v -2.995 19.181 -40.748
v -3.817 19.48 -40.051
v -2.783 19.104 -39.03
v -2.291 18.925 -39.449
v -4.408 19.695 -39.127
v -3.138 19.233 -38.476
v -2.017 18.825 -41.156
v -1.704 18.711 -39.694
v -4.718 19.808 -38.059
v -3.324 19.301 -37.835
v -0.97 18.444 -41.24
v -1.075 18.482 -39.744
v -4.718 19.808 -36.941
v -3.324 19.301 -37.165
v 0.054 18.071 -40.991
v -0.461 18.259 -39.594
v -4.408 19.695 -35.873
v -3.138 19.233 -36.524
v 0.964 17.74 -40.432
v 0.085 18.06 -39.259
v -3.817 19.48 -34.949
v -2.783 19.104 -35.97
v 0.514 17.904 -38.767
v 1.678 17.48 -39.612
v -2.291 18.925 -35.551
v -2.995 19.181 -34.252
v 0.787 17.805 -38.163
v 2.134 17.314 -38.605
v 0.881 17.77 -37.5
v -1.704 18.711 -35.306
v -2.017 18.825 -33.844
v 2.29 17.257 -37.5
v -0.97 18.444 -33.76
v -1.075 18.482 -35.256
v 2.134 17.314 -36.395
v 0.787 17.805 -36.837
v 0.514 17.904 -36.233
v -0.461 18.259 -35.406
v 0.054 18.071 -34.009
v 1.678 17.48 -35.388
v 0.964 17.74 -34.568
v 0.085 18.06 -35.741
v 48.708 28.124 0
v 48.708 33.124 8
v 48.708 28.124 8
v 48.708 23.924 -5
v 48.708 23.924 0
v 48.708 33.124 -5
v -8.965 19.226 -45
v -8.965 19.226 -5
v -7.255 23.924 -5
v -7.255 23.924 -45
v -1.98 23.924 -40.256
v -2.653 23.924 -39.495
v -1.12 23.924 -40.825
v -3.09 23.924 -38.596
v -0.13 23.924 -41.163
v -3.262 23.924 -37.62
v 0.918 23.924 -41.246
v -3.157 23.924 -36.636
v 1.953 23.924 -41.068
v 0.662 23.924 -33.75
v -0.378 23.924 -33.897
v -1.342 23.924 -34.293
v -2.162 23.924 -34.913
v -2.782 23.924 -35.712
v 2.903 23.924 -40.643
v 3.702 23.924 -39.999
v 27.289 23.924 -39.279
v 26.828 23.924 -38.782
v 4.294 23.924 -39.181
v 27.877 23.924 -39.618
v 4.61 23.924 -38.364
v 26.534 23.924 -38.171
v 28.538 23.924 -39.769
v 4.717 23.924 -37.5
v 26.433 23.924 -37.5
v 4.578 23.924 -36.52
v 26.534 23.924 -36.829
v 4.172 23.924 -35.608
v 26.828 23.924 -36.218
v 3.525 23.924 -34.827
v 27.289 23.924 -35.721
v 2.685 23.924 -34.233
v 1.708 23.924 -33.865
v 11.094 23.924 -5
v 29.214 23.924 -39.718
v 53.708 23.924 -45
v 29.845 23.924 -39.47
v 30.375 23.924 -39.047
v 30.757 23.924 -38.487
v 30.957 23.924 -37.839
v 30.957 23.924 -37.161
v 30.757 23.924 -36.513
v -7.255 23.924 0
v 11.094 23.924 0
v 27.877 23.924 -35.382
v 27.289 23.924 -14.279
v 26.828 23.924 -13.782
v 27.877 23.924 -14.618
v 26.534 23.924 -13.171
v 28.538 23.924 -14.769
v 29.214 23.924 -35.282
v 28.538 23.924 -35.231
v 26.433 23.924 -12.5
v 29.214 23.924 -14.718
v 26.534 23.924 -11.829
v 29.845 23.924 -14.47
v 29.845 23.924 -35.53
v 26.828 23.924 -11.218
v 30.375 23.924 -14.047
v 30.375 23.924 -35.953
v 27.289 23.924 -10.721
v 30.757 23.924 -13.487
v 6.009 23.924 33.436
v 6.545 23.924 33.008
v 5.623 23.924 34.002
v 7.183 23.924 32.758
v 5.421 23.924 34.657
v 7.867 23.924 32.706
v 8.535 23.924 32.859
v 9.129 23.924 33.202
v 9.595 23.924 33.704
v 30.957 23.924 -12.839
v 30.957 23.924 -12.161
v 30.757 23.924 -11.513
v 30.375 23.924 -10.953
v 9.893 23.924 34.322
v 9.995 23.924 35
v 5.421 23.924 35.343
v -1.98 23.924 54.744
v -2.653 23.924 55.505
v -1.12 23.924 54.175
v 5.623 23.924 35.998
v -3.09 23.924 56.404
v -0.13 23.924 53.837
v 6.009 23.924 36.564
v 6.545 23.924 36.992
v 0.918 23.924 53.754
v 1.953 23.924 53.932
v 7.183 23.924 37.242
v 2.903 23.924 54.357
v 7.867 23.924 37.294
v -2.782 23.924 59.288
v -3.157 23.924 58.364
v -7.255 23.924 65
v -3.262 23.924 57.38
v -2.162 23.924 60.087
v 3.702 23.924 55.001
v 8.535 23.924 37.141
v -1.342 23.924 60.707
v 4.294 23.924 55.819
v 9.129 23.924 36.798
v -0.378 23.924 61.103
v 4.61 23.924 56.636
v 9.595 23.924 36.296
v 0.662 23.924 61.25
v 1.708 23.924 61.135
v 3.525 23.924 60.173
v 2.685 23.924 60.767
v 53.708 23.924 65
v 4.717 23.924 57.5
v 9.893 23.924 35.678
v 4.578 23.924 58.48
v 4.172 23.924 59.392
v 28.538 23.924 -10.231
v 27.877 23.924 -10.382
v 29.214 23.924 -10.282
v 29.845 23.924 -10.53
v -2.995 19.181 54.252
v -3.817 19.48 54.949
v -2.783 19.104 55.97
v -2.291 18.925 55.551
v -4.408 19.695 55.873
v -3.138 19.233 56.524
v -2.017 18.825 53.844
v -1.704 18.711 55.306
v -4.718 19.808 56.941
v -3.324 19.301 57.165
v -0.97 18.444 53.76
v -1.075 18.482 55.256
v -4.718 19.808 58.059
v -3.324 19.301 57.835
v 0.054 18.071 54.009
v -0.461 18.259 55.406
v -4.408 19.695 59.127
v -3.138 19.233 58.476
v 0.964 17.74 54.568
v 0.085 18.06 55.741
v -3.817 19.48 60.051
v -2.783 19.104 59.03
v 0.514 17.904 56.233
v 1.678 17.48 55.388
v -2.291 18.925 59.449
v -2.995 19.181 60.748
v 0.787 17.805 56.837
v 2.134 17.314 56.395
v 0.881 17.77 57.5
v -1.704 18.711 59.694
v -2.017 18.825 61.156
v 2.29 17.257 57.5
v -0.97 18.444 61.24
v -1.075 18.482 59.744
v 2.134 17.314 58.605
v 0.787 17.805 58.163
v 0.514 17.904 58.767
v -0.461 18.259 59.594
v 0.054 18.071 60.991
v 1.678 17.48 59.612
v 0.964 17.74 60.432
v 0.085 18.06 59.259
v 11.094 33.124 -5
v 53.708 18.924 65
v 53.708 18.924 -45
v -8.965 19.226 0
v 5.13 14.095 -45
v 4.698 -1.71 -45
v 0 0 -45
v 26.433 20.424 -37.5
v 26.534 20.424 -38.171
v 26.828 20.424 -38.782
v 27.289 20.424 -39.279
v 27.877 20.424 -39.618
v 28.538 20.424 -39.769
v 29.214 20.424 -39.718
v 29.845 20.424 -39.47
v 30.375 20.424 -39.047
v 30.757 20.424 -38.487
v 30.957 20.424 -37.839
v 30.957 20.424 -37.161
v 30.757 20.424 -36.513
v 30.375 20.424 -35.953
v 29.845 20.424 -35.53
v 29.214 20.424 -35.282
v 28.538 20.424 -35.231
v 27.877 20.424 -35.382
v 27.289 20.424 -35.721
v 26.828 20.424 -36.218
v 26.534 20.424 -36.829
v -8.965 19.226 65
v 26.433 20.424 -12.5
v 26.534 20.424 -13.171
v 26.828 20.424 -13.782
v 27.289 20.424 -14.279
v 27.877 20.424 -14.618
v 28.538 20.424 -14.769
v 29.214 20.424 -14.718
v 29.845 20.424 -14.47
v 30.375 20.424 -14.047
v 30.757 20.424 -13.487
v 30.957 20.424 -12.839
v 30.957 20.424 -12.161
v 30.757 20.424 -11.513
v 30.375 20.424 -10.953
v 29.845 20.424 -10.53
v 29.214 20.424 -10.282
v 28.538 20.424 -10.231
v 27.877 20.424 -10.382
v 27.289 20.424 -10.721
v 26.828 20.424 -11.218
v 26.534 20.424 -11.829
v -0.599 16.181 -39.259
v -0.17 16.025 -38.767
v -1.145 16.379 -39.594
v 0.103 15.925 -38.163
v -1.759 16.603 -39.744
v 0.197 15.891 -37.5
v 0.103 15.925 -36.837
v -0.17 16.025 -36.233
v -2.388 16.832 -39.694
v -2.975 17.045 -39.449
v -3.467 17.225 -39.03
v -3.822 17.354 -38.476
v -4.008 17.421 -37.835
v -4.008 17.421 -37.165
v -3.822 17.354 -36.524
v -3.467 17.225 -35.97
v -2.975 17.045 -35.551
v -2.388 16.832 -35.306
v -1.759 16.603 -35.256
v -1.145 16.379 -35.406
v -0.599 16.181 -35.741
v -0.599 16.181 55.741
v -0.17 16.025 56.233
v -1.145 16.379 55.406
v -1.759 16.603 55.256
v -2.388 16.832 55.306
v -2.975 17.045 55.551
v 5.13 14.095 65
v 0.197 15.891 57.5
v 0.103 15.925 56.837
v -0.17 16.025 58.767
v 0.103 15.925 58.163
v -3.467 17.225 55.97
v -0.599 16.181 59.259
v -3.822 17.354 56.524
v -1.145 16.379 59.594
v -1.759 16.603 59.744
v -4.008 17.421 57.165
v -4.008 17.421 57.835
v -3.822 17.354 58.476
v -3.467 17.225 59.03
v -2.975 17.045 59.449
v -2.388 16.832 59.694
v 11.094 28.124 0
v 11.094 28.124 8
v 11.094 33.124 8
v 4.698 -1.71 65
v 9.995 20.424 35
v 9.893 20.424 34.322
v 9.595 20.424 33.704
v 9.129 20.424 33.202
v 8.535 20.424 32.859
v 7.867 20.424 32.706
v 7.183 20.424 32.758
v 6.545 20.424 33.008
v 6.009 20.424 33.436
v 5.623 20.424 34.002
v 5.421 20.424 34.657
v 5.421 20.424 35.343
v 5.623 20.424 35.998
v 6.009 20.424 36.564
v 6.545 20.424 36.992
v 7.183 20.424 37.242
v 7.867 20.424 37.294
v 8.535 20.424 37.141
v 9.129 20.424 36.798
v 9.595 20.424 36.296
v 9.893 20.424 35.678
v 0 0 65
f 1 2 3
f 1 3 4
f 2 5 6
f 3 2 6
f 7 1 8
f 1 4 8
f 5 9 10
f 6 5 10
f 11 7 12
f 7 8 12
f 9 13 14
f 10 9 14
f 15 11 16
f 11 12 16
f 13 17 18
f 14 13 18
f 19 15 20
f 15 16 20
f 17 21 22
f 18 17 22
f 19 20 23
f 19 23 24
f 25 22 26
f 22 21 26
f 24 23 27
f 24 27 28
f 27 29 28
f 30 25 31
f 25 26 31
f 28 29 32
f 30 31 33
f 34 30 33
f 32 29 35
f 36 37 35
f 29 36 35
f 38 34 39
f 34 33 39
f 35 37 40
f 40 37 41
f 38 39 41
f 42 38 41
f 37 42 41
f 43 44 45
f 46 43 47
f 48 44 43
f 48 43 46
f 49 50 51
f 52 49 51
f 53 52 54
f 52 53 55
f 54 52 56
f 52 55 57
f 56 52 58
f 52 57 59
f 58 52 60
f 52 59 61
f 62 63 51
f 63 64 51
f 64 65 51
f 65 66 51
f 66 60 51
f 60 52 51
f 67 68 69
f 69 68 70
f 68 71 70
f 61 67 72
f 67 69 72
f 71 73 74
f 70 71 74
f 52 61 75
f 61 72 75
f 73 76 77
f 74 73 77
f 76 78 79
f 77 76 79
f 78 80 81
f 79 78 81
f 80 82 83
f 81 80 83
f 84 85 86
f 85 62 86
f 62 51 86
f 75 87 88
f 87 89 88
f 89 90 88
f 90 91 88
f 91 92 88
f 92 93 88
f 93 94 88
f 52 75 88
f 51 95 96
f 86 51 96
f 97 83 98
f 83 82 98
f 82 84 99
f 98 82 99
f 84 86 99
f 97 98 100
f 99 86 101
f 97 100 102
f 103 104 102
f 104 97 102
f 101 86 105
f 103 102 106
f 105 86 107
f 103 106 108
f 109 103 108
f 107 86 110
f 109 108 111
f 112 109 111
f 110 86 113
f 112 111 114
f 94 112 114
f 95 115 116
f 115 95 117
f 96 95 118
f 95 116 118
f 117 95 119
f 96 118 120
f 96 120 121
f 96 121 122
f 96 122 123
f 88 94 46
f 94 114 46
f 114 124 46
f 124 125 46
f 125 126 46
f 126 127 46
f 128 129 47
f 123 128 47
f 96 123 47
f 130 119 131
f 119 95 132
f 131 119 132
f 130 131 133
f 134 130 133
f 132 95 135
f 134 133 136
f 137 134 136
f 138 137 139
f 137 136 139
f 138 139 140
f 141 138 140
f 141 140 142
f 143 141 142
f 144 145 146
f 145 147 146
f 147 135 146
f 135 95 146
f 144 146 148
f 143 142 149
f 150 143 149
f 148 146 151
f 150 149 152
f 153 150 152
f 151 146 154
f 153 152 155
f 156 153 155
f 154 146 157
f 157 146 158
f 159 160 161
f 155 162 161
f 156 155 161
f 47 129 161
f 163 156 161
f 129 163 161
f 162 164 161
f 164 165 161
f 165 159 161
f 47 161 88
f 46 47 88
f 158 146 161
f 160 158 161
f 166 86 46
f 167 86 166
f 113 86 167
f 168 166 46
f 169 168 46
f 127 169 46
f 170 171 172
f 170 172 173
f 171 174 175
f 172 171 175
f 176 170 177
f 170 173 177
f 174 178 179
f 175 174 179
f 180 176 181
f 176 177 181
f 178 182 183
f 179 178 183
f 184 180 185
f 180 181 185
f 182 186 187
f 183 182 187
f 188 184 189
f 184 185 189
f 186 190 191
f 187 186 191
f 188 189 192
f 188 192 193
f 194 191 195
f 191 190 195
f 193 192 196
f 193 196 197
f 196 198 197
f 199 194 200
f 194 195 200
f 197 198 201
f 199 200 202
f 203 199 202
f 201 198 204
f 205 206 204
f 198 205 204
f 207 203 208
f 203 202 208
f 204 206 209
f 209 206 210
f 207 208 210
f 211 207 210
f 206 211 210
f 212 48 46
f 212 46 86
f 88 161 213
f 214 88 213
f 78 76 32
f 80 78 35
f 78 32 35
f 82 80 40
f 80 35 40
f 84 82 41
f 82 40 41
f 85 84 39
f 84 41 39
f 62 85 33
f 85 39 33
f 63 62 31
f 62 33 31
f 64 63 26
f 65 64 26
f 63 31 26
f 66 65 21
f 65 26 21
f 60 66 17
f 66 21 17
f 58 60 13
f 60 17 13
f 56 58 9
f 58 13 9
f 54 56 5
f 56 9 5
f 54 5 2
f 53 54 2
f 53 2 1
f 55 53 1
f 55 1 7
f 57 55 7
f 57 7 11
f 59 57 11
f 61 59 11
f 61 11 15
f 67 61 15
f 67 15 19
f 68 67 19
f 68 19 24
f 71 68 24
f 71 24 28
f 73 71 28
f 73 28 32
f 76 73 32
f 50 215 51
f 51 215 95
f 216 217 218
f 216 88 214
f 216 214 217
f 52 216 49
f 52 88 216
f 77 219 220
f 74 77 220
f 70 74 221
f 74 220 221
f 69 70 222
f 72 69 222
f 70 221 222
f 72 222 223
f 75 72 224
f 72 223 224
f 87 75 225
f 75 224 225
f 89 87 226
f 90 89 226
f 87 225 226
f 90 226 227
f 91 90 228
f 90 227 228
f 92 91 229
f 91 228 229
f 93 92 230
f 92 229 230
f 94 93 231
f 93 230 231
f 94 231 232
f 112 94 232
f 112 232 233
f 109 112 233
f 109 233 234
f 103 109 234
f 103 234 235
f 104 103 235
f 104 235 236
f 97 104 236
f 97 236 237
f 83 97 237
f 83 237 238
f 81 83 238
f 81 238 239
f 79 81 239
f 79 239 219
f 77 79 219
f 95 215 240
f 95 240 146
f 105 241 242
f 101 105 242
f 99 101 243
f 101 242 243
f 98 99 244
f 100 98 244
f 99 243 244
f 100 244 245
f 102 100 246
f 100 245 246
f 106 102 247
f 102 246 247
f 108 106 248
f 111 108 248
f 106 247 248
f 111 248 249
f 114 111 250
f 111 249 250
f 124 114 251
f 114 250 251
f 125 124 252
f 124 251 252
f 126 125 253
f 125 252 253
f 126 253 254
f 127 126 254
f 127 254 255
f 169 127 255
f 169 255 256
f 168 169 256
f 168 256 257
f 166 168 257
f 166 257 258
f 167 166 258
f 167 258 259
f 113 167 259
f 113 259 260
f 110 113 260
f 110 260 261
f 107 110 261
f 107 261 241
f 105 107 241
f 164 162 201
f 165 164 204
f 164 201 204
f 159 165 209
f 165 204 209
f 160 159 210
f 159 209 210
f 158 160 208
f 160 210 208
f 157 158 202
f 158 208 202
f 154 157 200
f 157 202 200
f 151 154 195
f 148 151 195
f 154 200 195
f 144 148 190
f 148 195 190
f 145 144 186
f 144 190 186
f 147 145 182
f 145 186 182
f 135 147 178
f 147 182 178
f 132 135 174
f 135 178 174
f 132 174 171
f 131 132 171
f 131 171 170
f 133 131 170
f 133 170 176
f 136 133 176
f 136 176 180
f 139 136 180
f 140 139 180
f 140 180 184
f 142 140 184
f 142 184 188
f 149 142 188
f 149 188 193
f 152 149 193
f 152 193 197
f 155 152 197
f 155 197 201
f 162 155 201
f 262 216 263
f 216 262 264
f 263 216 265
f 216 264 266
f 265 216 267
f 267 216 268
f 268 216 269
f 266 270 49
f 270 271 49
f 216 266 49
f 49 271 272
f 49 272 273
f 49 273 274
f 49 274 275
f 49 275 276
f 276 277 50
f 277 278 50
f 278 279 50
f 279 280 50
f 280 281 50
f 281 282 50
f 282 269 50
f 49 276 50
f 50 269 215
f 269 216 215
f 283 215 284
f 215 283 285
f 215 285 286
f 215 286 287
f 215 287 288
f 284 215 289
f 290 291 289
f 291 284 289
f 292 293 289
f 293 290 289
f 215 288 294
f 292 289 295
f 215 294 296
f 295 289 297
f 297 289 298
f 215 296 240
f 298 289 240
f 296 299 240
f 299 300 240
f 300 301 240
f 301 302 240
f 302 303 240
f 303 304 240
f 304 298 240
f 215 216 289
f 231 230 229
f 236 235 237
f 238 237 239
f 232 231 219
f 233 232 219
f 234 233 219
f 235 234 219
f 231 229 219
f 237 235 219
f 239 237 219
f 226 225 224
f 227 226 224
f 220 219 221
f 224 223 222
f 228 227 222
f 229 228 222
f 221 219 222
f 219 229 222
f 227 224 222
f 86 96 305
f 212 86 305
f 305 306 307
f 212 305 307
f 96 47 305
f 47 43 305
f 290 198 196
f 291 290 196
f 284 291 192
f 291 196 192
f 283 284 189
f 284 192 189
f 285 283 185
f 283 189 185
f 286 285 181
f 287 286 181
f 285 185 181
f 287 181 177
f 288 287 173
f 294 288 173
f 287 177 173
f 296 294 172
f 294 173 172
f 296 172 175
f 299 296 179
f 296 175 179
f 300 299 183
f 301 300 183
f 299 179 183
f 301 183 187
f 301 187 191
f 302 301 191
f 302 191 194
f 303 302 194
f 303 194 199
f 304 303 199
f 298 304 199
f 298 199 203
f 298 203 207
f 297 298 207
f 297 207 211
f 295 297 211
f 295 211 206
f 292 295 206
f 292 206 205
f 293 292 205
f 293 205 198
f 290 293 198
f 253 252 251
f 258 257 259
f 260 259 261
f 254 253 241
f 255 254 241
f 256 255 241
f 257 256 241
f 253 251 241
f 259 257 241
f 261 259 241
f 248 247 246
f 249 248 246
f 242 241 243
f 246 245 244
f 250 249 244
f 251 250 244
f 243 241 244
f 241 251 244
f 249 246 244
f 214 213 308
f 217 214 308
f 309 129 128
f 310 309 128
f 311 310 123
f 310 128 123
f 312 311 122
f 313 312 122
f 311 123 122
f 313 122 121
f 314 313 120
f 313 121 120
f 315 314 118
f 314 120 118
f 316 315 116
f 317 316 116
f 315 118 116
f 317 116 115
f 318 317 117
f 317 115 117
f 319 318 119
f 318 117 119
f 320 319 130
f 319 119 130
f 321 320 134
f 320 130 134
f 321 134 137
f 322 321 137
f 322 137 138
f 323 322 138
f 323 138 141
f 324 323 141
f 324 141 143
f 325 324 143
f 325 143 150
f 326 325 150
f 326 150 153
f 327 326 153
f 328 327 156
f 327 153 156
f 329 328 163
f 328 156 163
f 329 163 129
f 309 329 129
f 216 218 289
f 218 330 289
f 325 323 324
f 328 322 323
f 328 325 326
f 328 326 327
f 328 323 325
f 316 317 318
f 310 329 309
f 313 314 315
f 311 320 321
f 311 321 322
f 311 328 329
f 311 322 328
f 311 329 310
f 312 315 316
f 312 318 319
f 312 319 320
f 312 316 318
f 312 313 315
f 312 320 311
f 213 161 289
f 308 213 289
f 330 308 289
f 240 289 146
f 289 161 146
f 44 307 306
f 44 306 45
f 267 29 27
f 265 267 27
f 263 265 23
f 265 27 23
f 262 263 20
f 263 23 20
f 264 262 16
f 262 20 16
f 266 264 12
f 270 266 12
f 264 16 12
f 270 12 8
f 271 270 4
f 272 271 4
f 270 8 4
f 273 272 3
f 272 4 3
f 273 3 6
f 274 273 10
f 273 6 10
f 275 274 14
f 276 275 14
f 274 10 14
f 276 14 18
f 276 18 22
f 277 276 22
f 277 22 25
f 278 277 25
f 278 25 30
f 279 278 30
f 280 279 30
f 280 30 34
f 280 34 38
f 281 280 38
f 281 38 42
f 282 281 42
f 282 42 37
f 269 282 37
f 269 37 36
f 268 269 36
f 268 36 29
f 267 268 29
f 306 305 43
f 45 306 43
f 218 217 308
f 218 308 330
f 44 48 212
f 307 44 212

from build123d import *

# Parameters (mm, degrees)
EXTRUDE_1_DEPTH        = 65
EXTRUDE_2_DEPTH        = 5
EXTRUDE_3_DEPTH        = 8
SKETCH_8_R             = 2.3
CUT_EXTRUDE_4_DEPTH    = 3.5
CUT_EXTRUDE_6_DEPTH    = 14
EXTRUDE_4_DEPTH        = 40
HOLE_WIZARD_M4_1_D     = 4.5
HOLE_WIZARD_M4_1_DEPTH = 10
HOLE_WIZARD_M4_1_TIP   = 1.351936393
CUT_EXTRUDE_START      = -2
SKETCH_16_R            = 3.75
CUT_EXTRUDE_7_DEPTH    = 33.495632075
F_4_0MM_1_D            = 4.55
F_4_0MM_1_DEPTH        = 3.5
CUT_EXTRUDE_8_DEPTH    = 5


with BuildPart() as part:
    # ｽｹｯﾁ1 → ﾎﾞｽ - 押し出し1 (new body)
    with BuildSketch(Plane.XY):
        Polygon((0, 0), (5.13030215, 14.095389312), (-8.965087162, 19.225691462), (-7.254986445, 23.924154566), (53.707680142, 23.924154566), (53.707680142, 18.924154566), (4.698463104, -1.710100717), align=None)
    extrude(amount=EXTRUDE_1_DEPTH)

    # ｽｹｯﾁ6 → ﾎﾞｽ - 押し出し2 (add)
    with BuildSketch(Plane(origin=(0, 0, 0), x_dir=(-1, 0, 0), z_dir=(0, 0, -1))):
        Polygon((-53.707680142, 33.124154566), (-53.707680142, 18.924154566), (-4.698463104, -1.710100717), (0, 0), (-5.13030215, 14.095389312), (8.965087162, 19.225691462), (3.90646029, 33.124154566), align=None)
    extrude(amount=EXTRUDE_2_DEPTH)

    # ｽｹｯﾁ7 → ﾎﾞｽ - 押し出し3 (add)
    with BuildSketch(Plane.XY):
        Polygon((-3.90646029, 33.124154566), (-5.726311461, 28.124154566), (53.707680142, 28.124154566), (53.707680142, 33.124154566), align=None)
    extrude(amount=EXTRUDE_3_DEPTH)

    # ｽｹｯﾁ8 → ｶｯﾄ - 押し出し4 (cut)
    with BuildSketch(Plane(origin=(0, 23.924154566, 0), x_dir=(1, 0, 0), z_dir=(0, 1, 0))):
        with Locations((7.695013555, -35)):
            Circle(SKETCH_8_R)
    extrude(amount=-CUT_EXTRUDE_4_DEPTH, mode=Mode.SUBTRACT)

    # ｽｹｯﾁ12 → ｶｯﾄ - 押し出し6 (cut, through all)
    with BuildSketch(Plane.XY.offset(8)):
        Polygon((-3.90646029, 33.124154566), (-7.254986445, 23.924154566), (11.09353971, 23.924154566), (11.09353971, 33.124154566), align=None)
    extrude(amount=-CUT_EXTRUDE_6_DEPTH, mode=Mode.SUBTRACT)

    # ｽｹｯﾁ13 → ﾎﾞｽ - 押し出し4 (add)
    with BuildSketch(Plane(origin=(0, 0, -5), x_dir=(-1, 0, 0), z_dir=(0, 0, -1))):
        Polygon((-4.698463104, -1.710100717), (0, 0), (-5.13030215, 14.095389312), (8.965087162, 19.225691462), (7.254986445, 23.924154566), (-53.707680142, 23.924154566), (-53.707680142, 18.924154566), align=None)
    extrude(amount=EXTRUDE_4_DEPTH)

    # M4 すきま穴1
    with Locations(Plane(origin=(5.13030215, 14.095389312, 0), x_dir=(-0.939692621, 0.342020143, 0), z_dir=(-0.342020143, -0.939692621, 0))):
        with Locations((7.5, -57.5), (7.5, 37.5)):
            Hole(HOLE_WIZARD_M4_1_D / 2, depth=HOLE_WIZARD_M4_1_DEPTH)
            with Locations((0, 0, -(HOLE_WIZARD_M4_1_DEPTH + HOLE_WIZARD_M4_1_TIP / 2))):  # 118° drill point
                Cone(0, HOLE_WIZARD_M4_1_D / 2, HOLE_WIZARD_M4_1_TIP, mode=Mode.SUBTRACT)

    # ｽｹｯﾁ16 → ｶｯﾄ - 押し出し7 (cut, through all)
    with BuildSketch(Plane(origin=(5.13030215, 14.095389312, 0), x_dir=(0.939692621, -0.342020143, 0), z_dir=(-0.342020143, -0.939692621, 0)).offset(CUT_EXTRUDE_START)):
        with Locations((-7.5, 57.5)):
            Circle(SKETCH_16_R)
        with Locations((-7.5, -37.5)):
            Circle(SKETCH_16_R)
    extrude(amount=-CUT_EXTRUDE_7_DEPTH, mode=Mode.SUBTRACT)

    # Ø4.0mm ﾀﾞｳｴﾙ穴1
    with Locations(Plane(origin=(0, 23.924154566, 0), x_dir=(1, 0, 0), z_dir=(0, 1, 0))):
        with Locations((28.707680142, 37.5), (28.707680142, 12.5)):
            Hole(F_4_0MM_1_D / 2, depth=F_4_0MM_1_DEPTH)

    # ｽｹｯﾁ19 → ｶｯﾄ - 押し出し8 (cut)
    with BuildSketch(Plane(origin=(53.707680142, 0, 0), x_dir=(0, 0, -1), z_dir=(1, 0, 0))):
        Polygon((0, 23.924154566), (5, 23.924154566), (5, 33.124154566), (-8, 33.124154566), (-8, 28.124154566), (0, 28.124154566), align=None)
    extrude(amount=-CUT_EXTRUDE_8_DEPTH, mode=Mode.SUBTRACT)


solid = part.part
